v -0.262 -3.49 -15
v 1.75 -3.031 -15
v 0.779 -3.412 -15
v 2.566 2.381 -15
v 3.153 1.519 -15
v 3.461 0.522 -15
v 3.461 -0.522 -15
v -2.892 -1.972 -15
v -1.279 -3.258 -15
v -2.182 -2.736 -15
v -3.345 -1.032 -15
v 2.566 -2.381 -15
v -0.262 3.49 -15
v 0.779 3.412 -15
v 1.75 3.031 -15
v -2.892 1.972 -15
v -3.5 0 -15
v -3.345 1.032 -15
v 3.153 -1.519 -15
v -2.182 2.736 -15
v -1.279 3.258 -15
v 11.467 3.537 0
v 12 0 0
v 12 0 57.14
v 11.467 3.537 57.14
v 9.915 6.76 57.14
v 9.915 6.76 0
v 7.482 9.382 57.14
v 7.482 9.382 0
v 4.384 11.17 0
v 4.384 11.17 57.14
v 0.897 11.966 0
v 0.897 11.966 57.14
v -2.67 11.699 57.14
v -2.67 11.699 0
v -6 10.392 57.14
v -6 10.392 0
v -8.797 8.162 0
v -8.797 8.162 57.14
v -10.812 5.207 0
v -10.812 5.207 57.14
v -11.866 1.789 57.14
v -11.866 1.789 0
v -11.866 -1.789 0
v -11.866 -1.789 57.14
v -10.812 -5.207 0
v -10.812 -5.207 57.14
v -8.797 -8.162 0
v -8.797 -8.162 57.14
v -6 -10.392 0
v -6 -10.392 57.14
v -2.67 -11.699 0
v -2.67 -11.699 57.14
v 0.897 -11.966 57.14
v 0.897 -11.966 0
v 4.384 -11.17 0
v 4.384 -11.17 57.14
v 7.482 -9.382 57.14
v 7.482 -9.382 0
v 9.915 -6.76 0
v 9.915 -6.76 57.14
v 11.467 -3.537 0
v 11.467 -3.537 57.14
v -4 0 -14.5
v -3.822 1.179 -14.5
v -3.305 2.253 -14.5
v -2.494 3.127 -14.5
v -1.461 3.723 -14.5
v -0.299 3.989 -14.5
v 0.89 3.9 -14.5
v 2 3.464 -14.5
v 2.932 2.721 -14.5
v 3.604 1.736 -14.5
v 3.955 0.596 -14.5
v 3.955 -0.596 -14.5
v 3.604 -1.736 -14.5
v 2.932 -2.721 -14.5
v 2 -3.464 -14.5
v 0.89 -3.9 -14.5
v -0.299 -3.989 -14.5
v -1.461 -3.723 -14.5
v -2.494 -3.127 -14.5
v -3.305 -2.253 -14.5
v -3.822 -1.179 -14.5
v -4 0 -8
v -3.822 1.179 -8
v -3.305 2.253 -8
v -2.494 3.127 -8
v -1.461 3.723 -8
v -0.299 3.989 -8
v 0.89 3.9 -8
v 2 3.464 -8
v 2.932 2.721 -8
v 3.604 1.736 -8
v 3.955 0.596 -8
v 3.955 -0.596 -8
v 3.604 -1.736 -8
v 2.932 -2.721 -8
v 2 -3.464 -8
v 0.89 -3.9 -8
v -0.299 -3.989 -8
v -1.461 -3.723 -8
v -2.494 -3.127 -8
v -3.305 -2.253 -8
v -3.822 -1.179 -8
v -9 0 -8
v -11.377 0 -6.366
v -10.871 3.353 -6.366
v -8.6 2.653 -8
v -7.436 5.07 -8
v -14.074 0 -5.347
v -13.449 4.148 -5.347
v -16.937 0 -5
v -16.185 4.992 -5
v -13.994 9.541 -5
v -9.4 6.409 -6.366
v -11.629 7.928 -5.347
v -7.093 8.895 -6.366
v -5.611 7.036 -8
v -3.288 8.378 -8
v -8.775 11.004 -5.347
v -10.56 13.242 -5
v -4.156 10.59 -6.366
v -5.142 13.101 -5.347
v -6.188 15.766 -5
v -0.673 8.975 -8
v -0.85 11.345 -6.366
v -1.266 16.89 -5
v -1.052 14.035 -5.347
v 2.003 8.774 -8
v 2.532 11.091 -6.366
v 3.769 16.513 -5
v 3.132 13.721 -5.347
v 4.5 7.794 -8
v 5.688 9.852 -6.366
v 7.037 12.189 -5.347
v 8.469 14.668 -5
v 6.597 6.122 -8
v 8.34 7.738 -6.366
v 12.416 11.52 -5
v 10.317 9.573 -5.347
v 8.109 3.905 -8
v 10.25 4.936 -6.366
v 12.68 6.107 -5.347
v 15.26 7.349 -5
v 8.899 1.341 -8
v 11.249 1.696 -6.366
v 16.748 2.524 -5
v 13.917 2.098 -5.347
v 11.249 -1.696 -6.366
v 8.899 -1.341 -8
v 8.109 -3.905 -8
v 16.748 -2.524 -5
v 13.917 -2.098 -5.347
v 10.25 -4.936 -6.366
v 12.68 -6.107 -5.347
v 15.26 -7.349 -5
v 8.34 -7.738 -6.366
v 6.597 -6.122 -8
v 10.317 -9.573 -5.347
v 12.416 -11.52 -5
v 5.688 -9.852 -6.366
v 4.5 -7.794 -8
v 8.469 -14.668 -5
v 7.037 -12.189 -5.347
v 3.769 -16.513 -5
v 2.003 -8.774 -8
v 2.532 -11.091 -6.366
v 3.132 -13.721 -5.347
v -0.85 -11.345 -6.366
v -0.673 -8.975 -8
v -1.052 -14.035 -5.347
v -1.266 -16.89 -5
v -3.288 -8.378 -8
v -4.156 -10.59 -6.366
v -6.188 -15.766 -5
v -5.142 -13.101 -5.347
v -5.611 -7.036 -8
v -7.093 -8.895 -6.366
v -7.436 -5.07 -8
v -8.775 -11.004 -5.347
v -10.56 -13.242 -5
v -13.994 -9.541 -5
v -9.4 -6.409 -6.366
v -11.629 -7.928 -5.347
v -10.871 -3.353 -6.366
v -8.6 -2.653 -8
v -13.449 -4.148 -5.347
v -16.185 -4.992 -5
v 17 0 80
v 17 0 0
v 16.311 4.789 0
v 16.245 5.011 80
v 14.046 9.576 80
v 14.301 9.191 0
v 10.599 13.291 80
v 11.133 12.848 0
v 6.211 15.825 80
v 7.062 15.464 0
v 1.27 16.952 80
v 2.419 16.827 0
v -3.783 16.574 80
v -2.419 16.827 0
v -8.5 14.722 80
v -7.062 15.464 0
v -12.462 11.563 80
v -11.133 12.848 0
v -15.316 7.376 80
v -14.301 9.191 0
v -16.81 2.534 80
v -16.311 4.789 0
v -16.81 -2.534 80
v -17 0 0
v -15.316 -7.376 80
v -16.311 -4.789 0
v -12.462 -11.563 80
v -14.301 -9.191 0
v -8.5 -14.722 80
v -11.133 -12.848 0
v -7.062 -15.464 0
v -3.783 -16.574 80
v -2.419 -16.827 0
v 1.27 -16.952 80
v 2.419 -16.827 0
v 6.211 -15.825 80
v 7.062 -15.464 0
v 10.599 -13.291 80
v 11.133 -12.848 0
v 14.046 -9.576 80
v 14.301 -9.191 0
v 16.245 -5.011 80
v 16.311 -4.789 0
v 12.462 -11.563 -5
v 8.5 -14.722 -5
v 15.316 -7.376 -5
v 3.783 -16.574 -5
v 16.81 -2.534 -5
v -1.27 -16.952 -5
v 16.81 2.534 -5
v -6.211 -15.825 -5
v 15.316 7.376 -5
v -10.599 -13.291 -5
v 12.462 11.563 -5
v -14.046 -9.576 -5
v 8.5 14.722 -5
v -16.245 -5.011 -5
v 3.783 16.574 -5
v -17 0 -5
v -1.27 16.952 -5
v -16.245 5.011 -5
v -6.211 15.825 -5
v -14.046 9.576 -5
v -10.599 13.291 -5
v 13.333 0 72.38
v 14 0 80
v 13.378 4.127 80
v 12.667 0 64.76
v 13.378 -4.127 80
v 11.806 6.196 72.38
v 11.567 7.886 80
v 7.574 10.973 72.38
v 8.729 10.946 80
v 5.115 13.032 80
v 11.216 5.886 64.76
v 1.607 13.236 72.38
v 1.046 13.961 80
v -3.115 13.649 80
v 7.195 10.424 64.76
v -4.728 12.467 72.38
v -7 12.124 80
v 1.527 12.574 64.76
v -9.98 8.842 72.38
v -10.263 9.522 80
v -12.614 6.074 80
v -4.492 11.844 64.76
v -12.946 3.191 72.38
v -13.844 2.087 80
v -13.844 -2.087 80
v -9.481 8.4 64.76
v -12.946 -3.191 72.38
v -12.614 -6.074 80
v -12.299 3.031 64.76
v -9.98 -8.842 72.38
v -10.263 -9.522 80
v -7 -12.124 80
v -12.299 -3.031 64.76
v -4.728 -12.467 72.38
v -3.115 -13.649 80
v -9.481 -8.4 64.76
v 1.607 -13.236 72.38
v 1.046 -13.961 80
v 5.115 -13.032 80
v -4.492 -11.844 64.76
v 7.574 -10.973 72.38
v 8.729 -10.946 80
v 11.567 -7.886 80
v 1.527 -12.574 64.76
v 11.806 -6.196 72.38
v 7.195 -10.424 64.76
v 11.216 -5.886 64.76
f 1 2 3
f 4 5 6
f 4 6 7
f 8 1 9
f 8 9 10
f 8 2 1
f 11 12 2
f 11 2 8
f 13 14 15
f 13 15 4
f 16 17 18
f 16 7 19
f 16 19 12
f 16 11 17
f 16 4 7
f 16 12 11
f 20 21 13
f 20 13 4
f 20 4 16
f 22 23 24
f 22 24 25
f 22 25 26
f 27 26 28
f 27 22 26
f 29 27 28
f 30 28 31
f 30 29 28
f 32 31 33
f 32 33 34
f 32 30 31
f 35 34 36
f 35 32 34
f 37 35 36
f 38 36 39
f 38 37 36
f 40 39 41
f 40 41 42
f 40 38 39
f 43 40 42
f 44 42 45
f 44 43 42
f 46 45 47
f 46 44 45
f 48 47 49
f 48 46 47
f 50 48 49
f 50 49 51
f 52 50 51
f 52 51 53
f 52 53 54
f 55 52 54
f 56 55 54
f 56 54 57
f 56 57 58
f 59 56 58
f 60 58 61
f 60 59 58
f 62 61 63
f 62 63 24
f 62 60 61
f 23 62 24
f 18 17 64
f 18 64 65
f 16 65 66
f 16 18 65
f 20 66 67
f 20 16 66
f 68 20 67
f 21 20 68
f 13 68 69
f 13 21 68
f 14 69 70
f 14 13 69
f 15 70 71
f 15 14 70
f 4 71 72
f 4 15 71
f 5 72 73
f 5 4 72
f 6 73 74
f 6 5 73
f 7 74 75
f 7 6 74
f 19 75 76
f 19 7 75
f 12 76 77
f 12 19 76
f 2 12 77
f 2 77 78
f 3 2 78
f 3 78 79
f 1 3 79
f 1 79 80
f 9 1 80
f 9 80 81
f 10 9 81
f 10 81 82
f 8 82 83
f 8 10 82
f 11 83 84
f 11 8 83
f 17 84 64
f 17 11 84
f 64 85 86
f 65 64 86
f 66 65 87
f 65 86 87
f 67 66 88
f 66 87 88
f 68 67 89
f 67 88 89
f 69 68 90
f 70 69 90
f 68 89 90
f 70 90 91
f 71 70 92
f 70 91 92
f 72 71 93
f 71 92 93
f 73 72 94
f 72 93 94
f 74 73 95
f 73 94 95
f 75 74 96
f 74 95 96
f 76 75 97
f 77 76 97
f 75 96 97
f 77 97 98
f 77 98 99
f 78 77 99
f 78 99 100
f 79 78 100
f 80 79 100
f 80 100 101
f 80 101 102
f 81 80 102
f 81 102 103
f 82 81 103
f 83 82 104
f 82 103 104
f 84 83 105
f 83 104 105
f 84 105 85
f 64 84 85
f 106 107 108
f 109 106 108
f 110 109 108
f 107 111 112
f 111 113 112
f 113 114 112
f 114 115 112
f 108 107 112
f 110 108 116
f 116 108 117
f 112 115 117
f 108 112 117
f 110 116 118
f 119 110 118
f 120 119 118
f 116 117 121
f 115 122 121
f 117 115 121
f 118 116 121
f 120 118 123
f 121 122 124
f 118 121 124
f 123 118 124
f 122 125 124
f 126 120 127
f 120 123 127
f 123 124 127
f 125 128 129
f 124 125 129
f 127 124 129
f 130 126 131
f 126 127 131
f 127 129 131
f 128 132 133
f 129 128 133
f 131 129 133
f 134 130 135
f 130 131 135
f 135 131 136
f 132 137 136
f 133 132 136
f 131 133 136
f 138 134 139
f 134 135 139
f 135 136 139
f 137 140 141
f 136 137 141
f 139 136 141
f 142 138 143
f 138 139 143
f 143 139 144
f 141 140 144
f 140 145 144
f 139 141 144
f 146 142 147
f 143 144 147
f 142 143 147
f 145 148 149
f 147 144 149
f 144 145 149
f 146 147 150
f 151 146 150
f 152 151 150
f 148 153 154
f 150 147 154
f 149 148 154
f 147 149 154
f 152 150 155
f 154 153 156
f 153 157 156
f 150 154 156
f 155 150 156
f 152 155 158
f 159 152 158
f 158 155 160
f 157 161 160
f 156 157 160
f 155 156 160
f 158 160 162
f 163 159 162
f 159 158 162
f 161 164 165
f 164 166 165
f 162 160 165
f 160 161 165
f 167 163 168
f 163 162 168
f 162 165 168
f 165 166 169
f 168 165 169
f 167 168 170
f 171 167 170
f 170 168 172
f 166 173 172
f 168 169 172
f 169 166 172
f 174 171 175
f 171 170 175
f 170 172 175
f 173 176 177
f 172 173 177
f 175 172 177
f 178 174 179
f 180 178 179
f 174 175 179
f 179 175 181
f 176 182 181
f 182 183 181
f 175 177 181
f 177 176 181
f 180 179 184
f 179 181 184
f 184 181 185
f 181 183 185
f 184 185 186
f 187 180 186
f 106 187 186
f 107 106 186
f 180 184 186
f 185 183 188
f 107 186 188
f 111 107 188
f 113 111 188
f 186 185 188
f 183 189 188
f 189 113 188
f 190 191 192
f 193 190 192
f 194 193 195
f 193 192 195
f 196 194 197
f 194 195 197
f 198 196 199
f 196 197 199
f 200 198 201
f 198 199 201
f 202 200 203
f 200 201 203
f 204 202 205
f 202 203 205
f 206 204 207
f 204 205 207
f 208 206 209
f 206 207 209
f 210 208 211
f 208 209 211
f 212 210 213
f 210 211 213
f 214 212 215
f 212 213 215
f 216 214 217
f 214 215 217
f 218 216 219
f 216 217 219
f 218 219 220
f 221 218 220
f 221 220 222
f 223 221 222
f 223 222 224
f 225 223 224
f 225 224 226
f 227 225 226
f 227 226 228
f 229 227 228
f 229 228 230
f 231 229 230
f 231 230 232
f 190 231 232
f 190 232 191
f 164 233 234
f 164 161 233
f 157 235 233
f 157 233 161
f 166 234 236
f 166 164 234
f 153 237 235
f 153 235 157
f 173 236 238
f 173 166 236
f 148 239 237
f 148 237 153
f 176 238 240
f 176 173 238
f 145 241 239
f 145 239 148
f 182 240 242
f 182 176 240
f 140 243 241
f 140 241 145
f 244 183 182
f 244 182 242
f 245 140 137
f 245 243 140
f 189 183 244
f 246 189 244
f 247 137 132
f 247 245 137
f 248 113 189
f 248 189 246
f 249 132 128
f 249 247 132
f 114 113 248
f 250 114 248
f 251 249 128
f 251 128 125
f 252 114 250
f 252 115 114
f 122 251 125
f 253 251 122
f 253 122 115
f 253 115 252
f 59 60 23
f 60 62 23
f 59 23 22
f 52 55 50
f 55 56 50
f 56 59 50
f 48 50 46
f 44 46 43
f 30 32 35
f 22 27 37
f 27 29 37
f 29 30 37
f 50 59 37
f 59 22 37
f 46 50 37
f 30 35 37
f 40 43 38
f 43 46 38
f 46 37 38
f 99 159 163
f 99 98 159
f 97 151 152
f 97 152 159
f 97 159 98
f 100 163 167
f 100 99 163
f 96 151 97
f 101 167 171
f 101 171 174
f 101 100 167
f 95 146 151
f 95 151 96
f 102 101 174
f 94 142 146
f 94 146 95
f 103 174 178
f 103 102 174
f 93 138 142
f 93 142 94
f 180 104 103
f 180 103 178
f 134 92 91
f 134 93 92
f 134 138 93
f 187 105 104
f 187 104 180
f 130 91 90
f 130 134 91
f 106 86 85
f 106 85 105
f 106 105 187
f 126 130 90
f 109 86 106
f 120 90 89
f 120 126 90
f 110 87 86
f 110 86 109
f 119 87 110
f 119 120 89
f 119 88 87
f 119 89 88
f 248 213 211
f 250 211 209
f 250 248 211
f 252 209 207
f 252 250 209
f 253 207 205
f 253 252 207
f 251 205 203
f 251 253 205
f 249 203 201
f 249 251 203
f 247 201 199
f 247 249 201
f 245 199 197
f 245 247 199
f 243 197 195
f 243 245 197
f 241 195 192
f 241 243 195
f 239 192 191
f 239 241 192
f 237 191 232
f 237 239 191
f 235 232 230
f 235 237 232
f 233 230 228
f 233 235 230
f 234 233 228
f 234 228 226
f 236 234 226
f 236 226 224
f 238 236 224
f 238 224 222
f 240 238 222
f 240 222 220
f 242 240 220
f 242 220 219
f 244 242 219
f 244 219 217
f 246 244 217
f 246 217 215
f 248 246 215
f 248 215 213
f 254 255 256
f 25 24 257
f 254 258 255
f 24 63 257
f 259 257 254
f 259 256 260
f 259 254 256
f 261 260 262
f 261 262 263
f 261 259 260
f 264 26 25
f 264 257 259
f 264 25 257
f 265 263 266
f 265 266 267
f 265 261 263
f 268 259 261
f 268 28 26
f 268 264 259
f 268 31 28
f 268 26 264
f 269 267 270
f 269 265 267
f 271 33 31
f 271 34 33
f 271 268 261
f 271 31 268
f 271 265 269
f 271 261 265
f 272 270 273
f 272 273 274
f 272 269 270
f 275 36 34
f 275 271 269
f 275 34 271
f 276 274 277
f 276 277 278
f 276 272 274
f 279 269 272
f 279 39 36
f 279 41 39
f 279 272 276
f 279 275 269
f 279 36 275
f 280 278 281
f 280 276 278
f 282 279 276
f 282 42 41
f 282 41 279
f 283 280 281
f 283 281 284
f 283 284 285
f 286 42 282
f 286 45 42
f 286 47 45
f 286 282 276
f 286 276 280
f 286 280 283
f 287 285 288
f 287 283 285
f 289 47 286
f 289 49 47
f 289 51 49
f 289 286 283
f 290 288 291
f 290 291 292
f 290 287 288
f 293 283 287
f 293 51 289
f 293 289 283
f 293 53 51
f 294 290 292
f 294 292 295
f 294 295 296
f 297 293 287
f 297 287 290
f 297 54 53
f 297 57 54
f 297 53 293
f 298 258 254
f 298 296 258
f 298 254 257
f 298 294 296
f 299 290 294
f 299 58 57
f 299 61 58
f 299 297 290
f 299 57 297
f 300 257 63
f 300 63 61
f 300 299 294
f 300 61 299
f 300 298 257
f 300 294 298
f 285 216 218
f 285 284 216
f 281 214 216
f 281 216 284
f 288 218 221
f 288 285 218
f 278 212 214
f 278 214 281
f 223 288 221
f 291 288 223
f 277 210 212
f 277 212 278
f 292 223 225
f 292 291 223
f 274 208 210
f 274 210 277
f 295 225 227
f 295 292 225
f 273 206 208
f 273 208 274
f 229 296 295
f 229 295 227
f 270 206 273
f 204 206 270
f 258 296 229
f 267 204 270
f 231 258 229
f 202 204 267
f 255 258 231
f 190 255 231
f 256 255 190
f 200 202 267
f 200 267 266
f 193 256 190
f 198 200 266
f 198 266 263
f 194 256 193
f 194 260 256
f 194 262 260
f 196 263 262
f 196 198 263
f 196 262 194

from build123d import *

# Parameters (mm, degrees)
SKETCH1_R           = 17
SKETCH1_R_2         = 12
BOSS_EXTRUDE1_DEPTH = 80
CHAMFER1_SIZE       = 2
CHAMFER1_SIZE2      = 22.860104606
BOSS_EXTRUDE2_START = 5
SKETCH2_R           = 17
BOSS_EXTRUDE2_DEPTH = 5
SKETCH3_R           = 9
SKETCH3_R_2         = 4
BOSS_EXTRUDE3_DEPTH = 3
BOSS_EXTRUDE4_START = 3
SKETCH3_3_R         = 4
BOSS_EXTRUDE4_DEPTH = 7
FILLET1_R           = 12
CHAMFER2_SIZE       = 0.5


with BuildPart() as part:
    # Sketch1 → Boss-Extrude1 (new body)
    with BuildSketch(Plane.XY):
        Circle(SKETCH1_R)
        Circle(SKETCH1_R_2, mode=Mode.SUBTRACT)
    extrude(amount=BOSS_EXTRUDE1_DEPTH)

    # Chamfer1
    chamfer1_edges = [part.edges().sort_by_distance(p)[0] for p in [
        (-12, 0, 80),
    ]]
    chamfer1_side = [part.faces().sort_by_distance(p)[0] for p in [
        (-16.519167389, 0, 80),
    ]]
    chamfer(chamfer1_edges, length=CHAMFER1_SIZE, length2=CHAMFER1_SIZE2, reference=chamfer1_side[0])

    # Sketch2 → Boss-Extrude2 (add)
    with BuildSketch(Plane(origin=(0, 0, 0), x_dir=(-1, 0, 0), z_dir=(0, 0, -1)).offset(BOSS_EXTRUDE2_START)):
        Circle(SKETCH2_R)
    extrude(amount=-BOSS_EXTRUDE2_DEPTH)

    # Sketch3 → Boss-Extrude3 (add)
    # profile 1 of 2: a face of its own
    with BuildSketch(Plane(origin=(0, 0, -5), x_dir=(-1, 0, 0), z_dir=(0, 0, -1))):
        Circle(SKETCH3_R)
        Circle(SKETCH3_R_2, mode=Mode.SUBTRACT)
    # profile 2 of 2: a face of its own
    with BuildSketch(Plane(origin=(0, 0, -5), x_dir=(-1, 0, 0), z_dir=(0, 0, -1))):
        Circle(SKETCH3_R_2)
    extrude(amount=BOSS_EXTRUDE3_DEPTH)

    # Sketch3<3> → Boss-Extrude4 (add)
    with BuildSketch(Plane(origin=(0, 0, -5), x_dir=(-1, 0, 0), z_dir=(0, 0, -1)).offset(BOSS_EXTRUDE4_START)):
        Circle(SKETCH3_3_R)
    extrude(amount=BOSS_EXTRUDE4_DEPTH)

    # Fillet1
    # the kernel refuses this fillet: 12 mm, written as the material it adds along each edge
    with BuildSketch(Plane(origin=(0, 0, -5), x_dir=(-1, 0, 0), z_dir=(0, -1, 0))) as fillet1_piece_1:
        with BuildLine():
            CenterArc((16.937253933, 12), FILLET1_R, 228.590377891, 41.409622109)
            Line((9, 3), (9, 0))
            Line((9, 0), (16.937253933, 0))
        make_face()
    revolve(axis=Axis((0, 0, -5), (0, 0, -1)))

    # Chamfer2
    chamfer2_edges = [part.edges().sort_by_distance(p)[0] for p in [
        (4, 0, -15),
    ]]
    chamfer(chamfer2_edges, length=CHAMFER2_SIZE)


solid = part.part
